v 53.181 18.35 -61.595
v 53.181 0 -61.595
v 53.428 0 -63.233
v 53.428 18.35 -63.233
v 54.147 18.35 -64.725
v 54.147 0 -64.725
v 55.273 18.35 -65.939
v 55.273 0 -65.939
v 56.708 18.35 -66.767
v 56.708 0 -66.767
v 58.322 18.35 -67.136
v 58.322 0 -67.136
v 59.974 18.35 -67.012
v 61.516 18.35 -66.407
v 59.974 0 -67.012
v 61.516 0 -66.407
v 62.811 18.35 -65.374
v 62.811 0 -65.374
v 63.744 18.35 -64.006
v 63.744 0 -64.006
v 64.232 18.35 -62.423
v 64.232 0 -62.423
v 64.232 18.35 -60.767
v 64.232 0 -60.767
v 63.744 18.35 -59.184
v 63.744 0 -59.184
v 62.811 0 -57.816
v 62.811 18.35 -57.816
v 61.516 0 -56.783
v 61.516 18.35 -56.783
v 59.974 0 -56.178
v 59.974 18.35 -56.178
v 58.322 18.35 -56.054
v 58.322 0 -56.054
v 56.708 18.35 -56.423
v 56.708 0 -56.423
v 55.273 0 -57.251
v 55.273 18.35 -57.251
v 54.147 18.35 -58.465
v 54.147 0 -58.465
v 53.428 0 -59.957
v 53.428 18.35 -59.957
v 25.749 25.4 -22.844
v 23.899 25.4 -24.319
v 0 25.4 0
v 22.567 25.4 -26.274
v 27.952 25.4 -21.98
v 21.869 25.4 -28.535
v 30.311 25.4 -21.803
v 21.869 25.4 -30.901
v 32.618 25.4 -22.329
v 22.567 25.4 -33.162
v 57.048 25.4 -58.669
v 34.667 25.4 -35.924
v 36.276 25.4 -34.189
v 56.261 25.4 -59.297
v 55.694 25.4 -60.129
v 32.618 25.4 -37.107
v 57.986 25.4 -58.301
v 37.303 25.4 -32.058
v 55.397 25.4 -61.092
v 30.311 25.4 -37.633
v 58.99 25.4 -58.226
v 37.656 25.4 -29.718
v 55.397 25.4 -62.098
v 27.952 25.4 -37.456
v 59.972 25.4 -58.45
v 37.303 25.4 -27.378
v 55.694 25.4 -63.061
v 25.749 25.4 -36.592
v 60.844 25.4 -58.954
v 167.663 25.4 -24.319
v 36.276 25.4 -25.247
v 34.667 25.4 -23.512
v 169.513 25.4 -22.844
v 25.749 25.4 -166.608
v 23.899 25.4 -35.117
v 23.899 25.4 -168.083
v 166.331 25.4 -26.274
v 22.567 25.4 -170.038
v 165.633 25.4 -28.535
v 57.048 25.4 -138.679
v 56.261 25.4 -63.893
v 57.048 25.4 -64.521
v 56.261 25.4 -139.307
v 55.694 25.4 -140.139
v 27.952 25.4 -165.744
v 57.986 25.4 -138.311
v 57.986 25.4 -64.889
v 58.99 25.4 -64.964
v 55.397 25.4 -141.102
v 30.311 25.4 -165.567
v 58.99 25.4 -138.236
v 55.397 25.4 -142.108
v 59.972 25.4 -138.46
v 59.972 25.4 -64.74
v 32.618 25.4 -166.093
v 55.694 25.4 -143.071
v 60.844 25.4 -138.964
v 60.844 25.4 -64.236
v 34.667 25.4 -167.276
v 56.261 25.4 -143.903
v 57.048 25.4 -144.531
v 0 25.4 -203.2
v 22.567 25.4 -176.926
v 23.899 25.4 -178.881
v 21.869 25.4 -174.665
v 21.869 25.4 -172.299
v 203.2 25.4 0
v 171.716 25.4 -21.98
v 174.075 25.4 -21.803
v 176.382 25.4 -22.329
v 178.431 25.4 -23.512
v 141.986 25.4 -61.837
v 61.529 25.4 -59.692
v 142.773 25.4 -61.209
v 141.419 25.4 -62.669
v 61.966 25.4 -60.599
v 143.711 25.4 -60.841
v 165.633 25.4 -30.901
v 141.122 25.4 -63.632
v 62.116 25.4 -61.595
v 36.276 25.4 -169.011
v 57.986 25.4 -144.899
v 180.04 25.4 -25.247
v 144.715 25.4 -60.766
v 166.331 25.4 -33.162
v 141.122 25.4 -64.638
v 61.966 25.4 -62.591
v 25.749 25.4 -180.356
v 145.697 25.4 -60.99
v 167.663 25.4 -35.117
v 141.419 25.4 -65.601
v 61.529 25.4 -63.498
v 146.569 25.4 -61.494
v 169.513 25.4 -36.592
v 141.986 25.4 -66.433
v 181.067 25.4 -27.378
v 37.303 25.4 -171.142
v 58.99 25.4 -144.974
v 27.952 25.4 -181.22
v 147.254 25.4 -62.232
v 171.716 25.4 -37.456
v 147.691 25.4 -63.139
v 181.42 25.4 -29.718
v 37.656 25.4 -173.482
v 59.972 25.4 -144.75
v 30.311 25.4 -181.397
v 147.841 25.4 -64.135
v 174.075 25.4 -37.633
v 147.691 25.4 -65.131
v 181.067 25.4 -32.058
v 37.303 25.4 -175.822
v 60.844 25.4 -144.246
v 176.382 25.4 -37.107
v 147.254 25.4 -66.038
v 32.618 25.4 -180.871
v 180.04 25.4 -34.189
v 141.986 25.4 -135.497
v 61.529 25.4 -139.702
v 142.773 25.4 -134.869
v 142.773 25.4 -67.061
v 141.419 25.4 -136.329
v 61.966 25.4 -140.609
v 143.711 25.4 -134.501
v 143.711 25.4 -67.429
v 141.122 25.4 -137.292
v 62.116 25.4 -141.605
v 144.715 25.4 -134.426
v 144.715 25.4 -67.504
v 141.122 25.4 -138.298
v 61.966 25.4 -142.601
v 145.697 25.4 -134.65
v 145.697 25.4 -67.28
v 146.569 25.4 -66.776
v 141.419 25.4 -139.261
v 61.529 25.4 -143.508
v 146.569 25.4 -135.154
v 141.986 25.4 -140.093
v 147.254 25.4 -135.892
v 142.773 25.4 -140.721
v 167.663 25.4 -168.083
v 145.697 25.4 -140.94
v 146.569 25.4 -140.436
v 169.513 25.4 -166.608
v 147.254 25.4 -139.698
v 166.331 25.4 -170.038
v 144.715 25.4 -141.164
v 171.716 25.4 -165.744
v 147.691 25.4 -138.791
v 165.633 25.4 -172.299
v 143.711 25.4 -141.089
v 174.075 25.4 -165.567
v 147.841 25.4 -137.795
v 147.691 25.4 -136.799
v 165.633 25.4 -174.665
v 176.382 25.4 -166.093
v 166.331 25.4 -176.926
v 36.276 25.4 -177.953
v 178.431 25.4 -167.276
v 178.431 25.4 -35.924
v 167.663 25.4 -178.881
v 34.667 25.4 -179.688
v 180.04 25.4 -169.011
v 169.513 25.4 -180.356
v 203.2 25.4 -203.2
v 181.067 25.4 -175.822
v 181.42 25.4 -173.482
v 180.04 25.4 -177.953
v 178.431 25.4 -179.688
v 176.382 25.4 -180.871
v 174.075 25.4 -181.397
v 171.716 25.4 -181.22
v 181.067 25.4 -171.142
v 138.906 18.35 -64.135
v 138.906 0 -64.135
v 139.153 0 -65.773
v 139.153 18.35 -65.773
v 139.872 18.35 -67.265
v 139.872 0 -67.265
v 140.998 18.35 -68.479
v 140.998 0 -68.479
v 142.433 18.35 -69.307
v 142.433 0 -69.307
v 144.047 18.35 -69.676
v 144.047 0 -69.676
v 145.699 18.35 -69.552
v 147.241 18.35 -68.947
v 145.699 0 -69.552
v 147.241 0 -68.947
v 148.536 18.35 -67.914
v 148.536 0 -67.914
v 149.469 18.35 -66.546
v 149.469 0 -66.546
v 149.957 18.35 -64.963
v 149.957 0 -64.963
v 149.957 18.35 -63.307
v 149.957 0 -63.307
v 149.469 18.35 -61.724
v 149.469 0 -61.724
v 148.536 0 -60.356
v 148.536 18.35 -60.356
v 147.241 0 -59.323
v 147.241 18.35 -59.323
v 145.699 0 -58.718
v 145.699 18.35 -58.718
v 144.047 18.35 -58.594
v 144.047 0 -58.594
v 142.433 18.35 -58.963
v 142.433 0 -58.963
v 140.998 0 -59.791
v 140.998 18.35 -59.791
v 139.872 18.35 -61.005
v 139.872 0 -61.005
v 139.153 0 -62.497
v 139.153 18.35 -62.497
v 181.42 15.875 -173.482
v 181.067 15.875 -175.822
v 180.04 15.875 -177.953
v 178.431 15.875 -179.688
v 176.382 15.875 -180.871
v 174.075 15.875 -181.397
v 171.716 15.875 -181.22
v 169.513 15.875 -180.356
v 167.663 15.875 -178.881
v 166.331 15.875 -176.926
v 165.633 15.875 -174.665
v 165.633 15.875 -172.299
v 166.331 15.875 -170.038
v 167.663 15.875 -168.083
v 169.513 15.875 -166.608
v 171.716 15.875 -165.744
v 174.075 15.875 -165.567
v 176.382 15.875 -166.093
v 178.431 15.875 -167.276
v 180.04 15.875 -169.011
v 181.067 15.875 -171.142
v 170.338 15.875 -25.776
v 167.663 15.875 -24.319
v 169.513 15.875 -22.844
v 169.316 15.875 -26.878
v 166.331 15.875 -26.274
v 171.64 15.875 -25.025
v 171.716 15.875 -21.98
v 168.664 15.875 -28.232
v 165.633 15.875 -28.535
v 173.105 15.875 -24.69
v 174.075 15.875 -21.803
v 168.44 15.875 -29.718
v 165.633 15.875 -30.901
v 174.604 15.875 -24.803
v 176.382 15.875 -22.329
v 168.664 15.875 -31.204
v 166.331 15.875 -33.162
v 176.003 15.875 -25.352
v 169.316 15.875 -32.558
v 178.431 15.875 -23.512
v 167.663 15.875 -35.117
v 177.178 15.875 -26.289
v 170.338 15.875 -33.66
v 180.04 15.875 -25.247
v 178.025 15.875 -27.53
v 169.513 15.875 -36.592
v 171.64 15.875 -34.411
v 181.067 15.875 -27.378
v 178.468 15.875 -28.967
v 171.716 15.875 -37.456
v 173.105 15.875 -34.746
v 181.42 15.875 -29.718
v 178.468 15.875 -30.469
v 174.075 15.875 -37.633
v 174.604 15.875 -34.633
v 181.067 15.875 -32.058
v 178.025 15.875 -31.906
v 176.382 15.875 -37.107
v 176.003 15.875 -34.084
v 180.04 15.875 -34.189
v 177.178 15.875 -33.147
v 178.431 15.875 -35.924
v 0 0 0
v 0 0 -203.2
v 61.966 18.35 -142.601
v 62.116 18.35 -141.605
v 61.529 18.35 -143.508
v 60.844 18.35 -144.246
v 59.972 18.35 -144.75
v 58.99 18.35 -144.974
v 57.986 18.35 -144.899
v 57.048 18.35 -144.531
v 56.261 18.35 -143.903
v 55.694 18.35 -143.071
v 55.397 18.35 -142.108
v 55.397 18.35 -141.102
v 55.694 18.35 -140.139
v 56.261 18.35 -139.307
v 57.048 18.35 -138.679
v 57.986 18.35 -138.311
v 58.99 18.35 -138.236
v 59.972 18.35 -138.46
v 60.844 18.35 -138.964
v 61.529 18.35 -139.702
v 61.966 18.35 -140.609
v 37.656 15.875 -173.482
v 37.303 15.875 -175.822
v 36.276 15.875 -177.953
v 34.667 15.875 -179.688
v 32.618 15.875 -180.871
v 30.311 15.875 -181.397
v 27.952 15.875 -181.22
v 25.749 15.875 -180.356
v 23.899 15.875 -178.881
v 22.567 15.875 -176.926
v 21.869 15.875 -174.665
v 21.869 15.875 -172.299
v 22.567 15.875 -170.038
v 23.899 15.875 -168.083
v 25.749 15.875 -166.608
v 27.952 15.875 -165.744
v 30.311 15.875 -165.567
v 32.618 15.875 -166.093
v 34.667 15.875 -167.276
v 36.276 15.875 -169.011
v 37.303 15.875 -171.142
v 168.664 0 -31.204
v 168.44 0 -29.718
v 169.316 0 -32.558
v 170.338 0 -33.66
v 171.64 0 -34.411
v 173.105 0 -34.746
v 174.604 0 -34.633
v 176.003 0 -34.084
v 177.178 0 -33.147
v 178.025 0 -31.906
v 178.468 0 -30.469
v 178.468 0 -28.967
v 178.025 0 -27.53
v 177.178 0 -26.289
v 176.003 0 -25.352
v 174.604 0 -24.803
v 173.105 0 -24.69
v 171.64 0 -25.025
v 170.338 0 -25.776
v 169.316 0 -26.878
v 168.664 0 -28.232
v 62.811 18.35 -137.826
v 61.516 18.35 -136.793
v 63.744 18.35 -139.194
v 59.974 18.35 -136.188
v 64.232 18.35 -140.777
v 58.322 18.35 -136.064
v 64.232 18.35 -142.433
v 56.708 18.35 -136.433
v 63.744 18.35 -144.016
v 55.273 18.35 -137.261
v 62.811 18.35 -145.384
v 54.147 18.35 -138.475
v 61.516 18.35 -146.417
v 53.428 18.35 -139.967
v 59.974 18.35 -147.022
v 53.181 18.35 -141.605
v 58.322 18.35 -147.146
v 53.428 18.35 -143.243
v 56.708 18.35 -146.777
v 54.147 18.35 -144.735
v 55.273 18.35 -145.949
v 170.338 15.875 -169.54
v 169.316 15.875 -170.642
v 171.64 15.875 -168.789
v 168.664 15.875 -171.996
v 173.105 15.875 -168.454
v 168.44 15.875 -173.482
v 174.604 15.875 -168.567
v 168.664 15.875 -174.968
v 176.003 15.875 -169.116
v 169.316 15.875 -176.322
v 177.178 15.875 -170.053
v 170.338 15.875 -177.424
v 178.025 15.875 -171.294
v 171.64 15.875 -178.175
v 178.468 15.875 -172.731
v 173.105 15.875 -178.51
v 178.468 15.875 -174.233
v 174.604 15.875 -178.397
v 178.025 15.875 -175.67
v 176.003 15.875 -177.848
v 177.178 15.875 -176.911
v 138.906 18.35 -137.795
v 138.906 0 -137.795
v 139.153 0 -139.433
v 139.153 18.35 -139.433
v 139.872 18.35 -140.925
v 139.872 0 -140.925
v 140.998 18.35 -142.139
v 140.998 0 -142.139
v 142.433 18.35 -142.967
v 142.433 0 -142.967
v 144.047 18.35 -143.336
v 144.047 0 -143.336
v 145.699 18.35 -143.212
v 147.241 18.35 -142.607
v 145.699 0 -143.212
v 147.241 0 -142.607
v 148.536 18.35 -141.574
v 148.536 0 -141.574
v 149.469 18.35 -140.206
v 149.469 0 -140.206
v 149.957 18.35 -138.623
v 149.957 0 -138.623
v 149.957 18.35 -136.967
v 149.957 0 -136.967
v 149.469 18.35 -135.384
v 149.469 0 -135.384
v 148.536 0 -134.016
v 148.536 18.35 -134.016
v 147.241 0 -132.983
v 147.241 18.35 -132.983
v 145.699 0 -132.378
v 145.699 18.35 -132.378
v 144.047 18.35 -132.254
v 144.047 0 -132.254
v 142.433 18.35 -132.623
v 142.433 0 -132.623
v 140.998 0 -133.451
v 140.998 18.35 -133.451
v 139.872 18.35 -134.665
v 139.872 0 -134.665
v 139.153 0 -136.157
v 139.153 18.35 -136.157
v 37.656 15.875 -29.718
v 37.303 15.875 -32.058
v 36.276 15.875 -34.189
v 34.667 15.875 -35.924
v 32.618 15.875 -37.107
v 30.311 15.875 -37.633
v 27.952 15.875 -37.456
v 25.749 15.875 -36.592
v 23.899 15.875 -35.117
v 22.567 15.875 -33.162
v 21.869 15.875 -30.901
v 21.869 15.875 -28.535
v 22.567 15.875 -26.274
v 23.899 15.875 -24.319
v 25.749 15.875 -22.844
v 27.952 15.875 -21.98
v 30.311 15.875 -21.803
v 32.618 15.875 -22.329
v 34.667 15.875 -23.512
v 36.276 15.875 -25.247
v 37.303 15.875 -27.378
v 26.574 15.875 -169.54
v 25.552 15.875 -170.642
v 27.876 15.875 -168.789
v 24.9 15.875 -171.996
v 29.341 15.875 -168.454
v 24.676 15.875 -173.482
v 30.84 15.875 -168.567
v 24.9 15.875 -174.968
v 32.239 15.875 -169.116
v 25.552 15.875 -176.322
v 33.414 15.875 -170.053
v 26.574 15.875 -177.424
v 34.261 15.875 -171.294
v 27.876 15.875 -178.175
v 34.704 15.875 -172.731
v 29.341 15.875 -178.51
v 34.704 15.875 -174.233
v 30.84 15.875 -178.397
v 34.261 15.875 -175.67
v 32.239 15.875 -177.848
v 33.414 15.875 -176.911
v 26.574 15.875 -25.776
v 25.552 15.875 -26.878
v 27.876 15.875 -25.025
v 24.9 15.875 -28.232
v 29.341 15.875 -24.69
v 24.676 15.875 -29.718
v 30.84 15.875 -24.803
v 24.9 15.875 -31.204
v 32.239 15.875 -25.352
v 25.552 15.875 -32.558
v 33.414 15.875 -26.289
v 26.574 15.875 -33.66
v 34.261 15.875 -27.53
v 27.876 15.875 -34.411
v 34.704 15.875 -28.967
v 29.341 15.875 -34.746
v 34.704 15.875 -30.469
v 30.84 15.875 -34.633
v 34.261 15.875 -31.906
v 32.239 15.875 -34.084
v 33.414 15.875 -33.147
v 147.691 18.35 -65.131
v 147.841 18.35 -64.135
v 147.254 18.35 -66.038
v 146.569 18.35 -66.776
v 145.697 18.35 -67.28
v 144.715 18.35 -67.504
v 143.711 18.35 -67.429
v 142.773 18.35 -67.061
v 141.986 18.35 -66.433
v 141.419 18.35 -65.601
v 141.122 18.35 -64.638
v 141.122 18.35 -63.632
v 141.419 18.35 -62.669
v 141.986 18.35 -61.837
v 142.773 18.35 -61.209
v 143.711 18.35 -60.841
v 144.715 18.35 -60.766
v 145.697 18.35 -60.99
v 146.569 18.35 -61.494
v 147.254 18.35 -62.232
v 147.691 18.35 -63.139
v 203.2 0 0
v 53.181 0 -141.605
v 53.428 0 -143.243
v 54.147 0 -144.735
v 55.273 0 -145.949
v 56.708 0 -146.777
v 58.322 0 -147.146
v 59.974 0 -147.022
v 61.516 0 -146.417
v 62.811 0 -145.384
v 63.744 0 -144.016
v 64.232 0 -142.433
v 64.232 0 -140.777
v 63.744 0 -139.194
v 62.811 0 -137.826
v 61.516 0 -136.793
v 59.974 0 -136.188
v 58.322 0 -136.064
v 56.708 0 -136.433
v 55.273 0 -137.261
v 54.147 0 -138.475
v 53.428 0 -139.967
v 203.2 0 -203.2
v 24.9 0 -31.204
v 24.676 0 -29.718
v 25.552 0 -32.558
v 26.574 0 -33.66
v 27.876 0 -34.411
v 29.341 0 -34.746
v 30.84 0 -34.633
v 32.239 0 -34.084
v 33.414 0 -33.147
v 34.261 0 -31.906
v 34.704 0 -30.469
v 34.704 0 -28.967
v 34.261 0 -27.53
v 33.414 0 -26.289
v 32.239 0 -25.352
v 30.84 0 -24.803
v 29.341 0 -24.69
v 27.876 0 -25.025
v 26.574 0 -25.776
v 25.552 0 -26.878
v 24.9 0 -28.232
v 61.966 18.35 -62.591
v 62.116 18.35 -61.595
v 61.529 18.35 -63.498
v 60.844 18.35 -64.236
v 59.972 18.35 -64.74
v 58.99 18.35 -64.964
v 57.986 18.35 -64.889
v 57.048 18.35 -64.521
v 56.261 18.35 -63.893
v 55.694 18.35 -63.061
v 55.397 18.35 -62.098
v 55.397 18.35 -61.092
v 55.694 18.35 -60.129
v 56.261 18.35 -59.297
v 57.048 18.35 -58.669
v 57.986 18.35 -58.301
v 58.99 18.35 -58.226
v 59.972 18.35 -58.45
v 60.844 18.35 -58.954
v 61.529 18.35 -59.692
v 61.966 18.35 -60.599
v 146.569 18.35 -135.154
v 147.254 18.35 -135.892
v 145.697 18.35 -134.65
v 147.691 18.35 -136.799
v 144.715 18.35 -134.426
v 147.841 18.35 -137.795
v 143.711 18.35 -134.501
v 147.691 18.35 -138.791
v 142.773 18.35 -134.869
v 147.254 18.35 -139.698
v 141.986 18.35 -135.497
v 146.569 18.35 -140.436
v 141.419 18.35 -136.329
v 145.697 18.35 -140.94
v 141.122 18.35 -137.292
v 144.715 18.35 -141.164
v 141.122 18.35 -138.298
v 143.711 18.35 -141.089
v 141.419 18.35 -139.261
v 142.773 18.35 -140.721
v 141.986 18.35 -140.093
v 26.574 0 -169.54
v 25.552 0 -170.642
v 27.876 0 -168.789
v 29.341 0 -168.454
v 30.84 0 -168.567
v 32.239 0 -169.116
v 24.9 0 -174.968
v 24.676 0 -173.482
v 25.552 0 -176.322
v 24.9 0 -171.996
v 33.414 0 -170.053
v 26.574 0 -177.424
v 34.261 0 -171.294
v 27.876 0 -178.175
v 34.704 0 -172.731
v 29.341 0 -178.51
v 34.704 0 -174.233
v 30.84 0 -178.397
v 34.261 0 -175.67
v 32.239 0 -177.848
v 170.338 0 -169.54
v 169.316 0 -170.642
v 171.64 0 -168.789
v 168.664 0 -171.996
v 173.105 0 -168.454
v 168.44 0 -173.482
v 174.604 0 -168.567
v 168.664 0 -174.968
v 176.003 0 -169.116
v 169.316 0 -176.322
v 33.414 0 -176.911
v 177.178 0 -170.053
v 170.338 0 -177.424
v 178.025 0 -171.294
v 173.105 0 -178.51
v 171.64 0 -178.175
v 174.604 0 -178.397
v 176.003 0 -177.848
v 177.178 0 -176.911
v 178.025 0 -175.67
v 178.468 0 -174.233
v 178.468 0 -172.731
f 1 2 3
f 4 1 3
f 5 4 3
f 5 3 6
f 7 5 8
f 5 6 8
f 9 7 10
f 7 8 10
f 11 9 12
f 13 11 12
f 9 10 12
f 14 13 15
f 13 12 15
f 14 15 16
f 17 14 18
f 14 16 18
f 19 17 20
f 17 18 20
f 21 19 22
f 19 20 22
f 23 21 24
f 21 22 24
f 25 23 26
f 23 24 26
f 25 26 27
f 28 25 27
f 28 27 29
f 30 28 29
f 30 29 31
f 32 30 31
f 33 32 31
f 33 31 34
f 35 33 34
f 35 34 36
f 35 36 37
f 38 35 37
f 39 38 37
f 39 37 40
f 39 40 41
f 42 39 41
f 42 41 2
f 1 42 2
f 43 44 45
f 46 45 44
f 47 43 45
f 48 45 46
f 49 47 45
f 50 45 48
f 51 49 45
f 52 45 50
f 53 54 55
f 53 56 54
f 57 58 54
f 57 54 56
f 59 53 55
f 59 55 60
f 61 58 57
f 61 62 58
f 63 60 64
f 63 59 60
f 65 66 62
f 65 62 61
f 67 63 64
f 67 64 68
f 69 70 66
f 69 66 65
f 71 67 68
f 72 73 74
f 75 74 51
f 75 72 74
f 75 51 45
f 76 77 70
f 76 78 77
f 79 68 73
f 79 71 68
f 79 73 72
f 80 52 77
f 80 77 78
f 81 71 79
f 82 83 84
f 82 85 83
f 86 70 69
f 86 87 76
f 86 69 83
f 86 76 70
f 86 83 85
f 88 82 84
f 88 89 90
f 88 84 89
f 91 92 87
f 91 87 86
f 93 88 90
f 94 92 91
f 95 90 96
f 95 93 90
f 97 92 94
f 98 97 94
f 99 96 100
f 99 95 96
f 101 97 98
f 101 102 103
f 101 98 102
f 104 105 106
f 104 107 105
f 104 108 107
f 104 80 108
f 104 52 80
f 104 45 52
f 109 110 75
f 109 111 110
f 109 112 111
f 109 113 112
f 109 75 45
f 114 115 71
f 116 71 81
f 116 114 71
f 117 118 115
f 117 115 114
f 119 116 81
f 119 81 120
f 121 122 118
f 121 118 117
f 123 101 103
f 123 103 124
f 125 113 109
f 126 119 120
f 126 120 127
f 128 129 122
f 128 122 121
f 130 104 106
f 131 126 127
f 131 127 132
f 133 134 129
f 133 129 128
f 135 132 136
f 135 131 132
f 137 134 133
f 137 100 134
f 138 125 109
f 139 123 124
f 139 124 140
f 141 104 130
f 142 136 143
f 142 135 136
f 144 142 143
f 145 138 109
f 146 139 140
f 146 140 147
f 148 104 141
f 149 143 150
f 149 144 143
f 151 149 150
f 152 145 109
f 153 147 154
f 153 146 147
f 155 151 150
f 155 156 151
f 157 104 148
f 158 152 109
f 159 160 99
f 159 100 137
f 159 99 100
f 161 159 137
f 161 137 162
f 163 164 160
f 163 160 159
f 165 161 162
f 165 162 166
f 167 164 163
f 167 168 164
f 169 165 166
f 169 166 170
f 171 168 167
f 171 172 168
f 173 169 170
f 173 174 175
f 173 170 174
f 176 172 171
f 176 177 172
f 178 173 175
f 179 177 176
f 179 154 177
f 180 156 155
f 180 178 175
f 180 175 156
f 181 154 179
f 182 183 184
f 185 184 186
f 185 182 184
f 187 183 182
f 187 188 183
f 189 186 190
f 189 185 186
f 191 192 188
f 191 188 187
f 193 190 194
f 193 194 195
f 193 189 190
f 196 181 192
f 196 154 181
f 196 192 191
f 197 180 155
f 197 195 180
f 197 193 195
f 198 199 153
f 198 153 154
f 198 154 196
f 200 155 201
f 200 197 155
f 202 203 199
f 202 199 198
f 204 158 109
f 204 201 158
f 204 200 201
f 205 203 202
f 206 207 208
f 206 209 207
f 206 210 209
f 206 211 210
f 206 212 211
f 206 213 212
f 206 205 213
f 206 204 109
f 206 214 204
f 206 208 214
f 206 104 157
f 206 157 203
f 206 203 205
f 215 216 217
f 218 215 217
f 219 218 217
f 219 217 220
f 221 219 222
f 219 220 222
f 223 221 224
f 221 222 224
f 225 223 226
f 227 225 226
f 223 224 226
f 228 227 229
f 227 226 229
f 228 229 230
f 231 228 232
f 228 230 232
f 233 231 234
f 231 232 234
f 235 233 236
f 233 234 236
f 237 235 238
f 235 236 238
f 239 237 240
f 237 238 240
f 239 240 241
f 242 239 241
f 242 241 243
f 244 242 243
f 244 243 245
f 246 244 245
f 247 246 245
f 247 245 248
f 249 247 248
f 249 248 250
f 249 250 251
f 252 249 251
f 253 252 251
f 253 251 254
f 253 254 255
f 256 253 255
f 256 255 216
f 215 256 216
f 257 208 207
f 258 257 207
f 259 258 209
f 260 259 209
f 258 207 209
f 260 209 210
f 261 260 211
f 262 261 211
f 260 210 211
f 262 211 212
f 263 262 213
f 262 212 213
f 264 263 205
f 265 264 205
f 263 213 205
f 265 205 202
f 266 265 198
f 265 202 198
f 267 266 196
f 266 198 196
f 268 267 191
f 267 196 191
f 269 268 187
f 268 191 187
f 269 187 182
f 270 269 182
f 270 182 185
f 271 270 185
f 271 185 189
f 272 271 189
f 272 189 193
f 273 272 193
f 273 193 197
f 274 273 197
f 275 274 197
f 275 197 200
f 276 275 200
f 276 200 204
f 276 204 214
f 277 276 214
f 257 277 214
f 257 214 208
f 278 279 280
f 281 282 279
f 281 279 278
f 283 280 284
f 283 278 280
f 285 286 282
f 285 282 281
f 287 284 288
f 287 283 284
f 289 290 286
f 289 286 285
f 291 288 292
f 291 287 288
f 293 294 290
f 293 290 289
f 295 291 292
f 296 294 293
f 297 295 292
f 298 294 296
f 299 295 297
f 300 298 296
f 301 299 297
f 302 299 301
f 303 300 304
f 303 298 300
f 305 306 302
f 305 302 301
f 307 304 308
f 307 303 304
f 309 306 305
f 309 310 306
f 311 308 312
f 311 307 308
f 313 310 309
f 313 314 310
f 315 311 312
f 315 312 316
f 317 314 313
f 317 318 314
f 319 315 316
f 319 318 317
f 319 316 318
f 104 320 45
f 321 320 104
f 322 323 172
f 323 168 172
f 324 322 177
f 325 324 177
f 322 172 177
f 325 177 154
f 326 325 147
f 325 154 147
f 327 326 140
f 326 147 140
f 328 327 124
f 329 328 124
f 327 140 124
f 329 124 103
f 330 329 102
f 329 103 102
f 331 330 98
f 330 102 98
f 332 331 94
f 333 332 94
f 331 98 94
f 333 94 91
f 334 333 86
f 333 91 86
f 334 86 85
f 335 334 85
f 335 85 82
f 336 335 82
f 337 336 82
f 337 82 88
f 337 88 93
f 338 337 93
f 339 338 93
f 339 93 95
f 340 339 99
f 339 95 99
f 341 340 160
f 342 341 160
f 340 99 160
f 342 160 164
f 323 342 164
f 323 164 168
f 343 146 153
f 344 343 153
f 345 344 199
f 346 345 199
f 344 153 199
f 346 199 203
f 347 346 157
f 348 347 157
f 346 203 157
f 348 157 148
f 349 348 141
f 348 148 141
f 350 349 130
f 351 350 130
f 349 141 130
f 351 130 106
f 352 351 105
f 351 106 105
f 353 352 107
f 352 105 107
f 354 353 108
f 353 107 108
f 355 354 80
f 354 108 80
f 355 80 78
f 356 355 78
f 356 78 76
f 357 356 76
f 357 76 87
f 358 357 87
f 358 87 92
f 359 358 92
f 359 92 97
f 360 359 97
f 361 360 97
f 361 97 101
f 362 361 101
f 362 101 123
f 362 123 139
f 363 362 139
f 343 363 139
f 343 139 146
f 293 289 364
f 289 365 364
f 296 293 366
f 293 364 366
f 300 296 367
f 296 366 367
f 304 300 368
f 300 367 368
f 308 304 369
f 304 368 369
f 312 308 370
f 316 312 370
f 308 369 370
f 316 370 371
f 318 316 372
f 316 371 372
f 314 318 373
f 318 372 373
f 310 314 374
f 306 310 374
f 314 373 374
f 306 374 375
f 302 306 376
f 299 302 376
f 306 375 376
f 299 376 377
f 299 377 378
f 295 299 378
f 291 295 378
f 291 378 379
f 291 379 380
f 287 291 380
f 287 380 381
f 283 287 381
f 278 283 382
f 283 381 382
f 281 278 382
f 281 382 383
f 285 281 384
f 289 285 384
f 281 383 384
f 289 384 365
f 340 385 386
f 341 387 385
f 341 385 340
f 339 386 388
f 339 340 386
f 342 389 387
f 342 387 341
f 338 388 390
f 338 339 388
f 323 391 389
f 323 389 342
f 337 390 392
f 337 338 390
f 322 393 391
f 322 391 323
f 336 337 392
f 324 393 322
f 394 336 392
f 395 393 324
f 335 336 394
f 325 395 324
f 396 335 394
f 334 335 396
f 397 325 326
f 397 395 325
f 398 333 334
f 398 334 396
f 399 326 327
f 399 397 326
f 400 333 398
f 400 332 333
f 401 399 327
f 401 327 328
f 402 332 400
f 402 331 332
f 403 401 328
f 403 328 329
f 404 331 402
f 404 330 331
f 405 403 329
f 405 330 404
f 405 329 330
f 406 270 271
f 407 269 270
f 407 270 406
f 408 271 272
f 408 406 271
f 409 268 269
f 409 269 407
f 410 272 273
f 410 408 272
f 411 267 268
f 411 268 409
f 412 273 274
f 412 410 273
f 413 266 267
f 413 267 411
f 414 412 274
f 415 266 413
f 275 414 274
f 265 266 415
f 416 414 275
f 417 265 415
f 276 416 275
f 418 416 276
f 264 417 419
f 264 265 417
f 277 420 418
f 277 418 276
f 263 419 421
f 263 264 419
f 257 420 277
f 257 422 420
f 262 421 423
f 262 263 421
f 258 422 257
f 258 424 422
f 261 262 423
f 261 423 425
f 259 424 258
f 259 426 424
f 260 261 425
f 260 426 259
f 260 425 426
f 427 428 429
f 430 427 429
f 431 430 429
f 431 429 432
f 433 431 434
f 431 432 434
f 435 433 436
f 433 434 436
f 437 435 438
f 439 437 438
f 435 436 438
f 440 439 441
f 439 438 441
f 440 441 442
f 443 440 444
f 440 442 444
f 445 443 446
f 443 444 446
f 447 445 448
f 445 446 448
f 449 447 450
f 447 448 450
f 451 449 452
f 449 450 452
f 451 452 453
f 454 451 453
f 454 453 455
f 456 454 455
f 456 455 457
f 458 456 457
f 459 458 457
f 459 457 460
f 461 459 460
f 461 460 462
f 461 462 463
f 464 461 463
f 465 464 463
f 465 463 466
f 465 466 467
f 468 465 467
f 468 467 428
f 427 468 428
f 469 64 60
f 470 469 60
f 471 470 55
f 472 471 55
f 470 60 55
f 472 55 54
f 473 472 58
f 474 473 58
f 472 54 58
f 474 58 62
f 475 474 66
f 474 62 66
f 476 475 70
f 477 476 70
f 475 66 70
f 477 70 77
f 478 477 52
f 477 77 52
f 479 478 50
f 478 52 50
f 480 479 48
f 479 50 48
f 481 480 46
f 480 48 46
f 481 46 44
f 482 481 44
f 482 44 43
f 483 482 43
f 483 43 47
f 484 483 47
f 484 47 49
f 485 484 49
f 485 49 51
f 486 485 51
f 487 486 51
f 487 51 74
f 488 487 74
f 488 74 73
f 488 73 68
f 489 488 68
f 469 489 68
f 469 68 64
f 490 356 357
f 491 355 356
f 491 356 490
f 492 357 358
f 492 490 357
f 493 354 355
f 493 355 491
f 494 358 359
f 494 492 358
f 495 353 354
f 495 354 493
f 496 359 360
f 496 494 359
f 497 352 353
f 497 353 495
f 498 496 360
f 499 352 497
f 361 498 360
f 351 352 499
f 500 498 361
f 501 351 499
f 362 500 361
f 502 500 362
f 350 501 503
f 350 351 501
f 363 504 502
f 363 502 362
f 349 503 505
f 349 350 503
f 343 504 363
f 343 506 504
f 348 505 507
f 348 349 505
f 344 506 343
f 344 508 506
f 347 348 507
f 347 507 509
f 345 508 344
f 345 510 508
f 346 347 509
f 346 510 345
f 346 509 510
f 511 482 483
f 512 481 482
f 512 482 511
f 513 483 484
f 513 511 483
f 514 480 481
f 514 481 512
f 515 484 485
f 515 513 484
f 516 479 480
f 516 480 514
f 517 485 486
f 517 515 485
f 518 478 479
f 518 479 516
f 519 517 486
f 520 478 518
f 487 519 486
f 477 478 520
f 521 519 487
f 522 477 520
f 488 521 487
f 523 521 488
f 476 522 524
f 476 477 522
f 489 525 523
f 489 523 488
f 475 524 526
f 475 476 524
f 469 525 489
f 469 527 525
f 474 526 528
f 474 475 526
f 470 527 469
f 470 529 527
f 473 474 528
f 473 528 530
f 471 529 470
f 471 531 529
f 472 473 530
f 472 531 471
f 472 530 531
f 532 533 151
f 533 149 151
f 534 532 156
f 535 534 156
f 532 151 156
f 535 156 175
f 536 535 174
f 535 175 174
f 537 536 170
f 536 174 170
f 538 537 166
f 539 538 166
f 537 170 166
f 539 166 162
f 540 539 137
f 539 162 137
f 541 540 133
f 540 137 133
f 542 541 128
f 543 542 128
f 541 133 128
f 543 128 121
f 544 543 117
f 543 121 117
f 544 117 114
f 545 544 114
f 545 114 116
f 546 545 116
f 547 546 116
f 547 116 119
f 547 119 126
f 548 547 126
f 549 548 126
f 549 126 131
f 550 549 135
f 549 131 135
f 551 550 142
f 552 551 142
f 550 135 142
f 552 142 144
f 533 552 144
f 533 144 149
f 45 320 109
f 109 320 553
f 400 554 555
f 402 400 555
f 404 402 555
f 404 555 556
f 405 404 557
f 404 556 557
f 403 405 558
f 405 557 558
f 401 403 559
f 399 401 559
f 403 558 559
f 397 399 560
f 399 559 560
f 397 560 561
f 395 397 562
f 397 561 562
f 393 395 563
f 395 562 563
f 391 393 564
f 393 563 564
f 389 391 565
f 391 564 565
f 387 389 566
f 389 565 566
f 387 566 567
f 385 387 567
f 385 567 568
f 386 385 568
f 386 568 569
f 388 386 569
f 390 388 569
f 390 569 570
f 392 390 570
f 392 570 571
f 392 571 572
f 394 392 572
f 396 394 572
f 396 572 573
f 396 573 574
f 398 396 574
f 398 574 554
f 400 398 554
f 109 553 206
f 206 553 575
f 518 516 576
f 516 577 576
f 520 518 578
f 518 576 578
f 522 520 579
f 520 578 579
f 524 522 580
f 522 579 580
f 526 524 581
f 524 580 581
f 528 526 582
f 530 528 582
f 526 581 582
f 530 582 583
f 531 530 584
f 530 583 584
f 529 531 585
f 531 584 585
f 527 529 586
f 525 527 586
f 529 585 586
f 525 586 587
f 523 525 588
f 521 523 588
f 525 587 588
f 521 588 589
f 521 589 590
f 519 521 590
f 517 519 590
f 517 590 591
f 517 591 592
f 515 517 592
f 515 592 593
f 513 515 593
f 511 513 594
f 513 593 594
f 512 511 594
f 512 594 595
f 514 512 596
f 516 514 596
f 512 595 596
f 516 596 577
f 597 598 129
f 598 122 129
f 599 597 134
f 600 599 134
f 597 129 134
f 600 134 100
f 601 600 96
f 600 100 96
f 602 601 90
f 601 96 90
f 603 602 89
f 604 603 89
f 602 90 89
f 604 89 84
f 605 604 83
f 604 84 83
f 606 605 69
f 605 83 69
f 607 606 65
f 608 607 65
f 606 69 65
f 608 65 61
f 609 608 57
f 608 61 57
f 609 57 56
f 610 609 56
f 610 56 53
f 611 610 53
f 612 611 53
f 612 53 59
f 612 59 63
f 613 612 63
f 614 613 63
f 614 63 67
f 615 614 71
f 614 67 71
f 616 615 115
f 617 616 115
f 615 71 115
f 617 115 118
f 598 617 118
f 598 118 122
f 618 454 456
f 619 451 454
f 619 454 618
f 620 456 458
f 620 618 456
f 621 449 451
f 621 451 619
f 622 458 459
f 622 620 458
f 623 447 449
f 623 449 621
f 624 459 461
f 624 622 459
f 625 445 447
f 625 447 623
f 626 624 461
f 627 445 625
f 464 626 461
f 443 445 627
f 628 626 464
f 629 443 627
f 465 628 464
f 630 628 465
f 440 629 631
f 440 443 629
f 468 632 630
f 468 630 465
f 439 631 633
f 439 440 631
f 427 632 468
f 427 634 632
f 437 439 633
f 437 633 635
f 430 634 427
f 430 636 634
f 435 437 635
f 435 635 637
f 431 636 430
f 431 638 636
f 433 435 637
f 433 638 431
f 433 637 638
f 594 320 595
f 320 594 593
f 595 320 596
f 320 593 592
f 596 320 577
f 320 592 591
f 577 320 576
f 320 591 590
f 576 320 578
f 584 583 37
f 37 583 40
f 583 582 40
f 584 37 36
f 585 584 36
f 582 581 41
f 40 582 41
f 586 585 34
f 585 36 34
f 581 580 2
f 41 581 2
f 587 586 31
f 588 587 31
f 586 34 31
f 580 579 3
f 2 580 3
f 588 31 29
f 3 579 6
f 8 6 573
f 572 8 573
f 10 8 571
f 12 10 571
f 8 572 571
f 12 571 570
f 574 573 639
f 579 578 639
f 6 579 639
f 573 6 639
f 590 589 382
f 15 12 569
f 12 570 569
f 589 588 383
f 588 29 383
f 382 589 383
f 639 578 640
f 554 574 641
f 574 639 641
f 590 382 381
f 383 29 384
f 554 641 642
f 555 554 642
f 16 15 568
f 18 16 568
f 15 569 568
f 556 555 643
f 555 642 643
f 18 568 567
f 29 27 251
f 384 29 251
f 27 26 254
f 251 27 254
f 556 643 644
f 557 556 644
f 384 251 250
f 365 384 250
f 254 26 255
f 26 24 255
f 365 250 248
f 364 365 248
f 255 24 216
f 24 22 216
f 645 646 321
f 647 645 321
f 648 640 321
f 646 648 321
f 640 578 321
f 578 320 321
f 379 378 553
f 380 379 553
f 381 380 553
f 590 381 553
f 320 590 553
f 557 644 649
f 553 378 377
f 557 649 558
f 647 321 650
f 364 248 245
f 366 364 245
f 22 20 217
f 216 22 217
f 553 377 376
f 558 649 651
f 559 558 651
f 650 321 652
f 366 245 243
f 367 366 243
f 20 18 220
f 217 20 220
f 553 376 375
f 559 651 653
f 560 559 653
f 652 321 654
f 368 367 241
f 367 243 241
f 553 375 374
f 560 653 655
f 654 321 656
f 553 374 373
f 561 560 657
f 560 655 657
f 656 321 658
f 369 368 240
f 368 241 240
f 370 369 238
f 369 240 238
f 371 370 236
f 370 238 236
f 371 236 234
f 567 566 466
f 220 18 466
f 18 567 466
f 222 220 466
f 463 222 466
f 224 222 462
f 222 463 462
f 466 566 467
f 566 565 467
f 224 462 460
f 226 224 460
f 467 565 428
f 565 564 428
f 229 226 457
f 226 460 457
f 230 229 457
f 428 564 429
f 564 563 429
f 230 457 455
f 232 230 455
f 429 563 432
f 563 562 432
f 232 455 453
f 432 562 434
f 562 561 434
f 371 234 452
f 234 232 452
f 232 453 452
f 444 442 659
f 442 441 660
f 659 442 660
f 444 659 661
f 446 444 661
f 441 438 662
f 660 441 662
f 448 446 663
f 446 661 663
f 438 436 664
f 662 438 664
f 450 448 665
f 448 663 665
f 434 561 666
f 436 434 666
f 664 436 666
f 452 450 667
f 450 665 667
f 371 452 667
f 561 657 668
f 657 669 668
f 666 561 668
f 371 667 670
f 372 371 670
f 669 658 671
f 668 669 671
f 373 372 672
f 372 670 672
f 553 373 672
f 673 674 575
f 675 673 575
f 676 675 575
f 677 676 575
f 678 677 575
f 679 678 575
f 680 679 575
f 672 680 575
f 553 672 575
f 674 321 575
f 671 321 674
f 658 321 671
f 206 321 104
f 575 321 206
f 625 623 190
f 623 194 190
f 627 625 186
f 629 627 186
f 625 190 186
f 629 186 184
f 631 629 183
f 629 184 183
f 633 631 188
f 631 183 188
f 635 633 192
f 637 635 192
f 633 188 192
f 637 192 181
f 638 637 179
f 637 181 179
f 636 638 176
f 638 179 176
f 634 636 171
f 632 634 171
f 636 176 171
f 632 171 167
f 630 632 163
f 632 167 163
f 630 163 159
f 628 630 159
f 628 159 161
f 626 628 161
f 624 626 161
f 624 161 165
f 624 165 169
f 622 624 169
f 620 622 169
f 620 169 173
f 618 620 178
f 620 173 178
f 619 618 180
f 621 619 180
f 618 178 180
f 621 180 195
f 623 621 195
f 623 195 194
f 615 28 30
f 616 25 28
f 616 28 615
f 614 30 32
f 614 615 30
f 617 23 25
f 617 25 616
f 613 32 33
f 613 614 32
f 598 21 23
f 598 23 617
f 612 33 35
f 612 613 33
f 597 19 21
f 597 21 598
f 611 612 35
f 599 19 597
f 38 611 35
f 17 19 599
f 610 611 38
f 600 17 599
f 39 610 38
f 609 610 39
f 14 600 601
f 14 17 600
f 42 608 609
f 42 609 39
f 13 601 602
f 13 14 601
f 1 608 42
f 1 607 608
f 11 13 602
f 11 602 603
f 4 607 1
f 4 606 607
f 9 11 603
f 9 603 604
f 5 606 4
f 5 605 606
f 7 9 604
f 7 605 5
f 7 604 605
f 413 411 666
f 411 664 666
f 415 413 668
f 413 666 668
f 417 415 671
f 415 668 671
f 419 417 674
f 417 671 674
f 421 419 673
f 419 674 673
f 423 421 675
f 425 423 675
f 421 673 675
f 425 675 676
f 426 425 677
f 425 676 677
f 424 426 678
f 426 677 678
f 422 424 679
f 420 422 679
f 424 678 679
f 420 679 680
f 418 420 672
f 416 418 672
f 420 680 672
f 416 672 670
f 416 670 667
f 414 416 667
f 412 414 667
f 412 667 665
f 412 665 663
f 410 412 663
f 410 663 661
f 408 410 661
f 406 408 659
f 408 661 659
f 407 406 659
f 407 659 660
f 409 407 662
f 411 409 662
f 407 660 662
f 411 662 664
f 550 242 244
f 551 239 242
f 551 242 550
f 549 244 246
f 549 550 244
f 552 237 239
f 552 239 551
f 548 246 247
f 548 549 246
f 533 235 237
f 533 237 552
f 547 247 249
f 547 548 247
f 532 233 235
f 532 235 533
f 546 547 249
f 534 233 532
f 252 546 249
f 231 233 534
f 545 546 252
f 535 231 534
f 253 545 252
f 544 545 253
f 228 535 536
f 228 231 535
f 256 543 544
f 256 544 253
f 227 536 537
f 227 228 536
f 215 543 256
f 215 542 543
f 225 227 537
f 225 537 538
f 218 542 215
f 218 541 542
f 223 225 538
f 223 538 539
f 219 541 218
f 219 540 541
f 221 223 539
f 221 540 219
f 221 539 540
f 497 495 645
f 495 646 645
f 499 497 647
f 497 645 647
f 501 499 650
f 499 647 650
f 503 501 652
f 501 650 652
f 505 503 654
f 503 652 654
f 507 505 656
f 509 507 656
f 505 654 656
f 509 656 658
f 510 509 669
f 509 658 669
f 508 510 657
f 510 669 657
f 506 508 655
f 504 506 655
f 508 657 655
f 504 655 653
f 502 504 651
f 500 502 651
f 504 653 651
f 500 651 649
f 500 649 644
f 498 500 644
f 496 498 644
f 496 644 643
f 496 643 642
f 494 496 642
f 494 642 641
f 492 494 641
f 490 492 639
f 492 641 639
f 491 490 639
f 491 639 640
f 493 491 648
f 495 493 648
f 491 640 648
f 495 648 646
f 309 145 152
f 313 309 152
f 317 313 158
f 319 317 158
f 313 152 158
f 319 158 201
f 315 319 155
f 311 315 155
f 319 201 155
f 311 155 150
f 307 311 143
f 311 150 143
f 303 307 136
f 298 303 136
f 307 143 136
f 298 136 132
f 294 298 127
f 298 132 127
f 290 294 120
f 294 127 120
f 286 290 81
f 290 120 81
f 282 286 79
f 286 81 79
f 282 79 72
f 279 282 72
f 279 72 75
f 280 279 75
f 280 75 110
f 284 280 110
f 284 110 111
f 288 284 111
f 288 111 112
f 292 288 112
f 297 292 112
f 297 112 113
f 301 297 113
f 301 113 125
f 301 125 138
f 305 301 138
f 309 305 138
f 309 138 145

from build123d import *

# Parameters (mm, degrees)
SKETCH1_W                                        = 203.2
SKETCH1_H                                        = 203.2
BOSS_EXTRUDE1_DEPTH                              = 25.4
CBORE_FOR_1_4_SOCKET_HEAD_CAP_SCREW1_D           = 6.7564
CBORE_FOR_1_4_SOCKET_HEAD_CAP_SCREW1_CBORE_D     = 11.1125
CBORE_FOR_1_4_SOCKET_HEAD_CAP_SCREW1_CBORE_DEPTH = 18.3500014
CBORE_FOR_3_8_SOCKET_HEAD_CAP_SCREW1_D           = 10.0838
CBORE_FOR_3_8_SOCKET_HEAD_CAP_SCREW1_CBORE_D     = 15.875
CBORE_FOR_3_8_SOCKET_HEAD_CAP_SCREW1_CBORE_DEPTH = 9.525


with BuildPart() as part:
    # Sketch1 → Boss-Extrude1 (new body)
    with BuildSketch(Plane(origin=(0, 0, 0), x_dir=(1, 0, 0), z_dir=(0, 1, 0))):
        with Locations((101.6, 101.6)):
            Rectangle(SKETCH1_W, SKETCH1_H)
    extrude(amount=BOSS_EXTRUDE1_DEPTH)

    # CBORE for 1/4 Socket Head Cap Screw1 (through all)
    with Locations(Plane(origin=(0, 0, 0), x_dir=(-1, 0, 0), z_dir=(0, -1, 0))):
        with Locations((-144.4625, 64.135), (-58.7375, 61.595), (-58.7375, 141.605), (-144.4625, 137.795)):
            CounterBoreHole(CBORE_FOR_1_4_SOCKET_HEAD_CAP_SCREW1_D / 2, CBORE_FOR_1_4_SOCKET_HEAD_CAP_SCREW1_CBORE_D / 2, CBORE_FOR_1_4_SOCKET_HEAD_CAP_SCREW1_CBORE_DEPTH)

    # CBORE for 3/8 Socket Head Cap Screw1 (through all)
    with Locations(Plane(origin=(0, 25.4, 0), x_dir=(1, 0, 0), z_dir=(0, 1, 0))):
        with Locations((29.718, 173.482), (29.718, 29.718), (173.482, 29.718), (173.482, 173.482)):
            CounterBoreHole(CBORE_FOR_3_8_SOCKET_HEAD_CAP_SCREW1_D / 2, CBORE_FOR_3_8_SOCKET_HEAD_CAP_SCREW1_CBORE_D / 2, CBORE_FOR_3_8_SOCKET_HEAD_CAP_SCREW1_CBORE_DEPTH)


solid = part.part
